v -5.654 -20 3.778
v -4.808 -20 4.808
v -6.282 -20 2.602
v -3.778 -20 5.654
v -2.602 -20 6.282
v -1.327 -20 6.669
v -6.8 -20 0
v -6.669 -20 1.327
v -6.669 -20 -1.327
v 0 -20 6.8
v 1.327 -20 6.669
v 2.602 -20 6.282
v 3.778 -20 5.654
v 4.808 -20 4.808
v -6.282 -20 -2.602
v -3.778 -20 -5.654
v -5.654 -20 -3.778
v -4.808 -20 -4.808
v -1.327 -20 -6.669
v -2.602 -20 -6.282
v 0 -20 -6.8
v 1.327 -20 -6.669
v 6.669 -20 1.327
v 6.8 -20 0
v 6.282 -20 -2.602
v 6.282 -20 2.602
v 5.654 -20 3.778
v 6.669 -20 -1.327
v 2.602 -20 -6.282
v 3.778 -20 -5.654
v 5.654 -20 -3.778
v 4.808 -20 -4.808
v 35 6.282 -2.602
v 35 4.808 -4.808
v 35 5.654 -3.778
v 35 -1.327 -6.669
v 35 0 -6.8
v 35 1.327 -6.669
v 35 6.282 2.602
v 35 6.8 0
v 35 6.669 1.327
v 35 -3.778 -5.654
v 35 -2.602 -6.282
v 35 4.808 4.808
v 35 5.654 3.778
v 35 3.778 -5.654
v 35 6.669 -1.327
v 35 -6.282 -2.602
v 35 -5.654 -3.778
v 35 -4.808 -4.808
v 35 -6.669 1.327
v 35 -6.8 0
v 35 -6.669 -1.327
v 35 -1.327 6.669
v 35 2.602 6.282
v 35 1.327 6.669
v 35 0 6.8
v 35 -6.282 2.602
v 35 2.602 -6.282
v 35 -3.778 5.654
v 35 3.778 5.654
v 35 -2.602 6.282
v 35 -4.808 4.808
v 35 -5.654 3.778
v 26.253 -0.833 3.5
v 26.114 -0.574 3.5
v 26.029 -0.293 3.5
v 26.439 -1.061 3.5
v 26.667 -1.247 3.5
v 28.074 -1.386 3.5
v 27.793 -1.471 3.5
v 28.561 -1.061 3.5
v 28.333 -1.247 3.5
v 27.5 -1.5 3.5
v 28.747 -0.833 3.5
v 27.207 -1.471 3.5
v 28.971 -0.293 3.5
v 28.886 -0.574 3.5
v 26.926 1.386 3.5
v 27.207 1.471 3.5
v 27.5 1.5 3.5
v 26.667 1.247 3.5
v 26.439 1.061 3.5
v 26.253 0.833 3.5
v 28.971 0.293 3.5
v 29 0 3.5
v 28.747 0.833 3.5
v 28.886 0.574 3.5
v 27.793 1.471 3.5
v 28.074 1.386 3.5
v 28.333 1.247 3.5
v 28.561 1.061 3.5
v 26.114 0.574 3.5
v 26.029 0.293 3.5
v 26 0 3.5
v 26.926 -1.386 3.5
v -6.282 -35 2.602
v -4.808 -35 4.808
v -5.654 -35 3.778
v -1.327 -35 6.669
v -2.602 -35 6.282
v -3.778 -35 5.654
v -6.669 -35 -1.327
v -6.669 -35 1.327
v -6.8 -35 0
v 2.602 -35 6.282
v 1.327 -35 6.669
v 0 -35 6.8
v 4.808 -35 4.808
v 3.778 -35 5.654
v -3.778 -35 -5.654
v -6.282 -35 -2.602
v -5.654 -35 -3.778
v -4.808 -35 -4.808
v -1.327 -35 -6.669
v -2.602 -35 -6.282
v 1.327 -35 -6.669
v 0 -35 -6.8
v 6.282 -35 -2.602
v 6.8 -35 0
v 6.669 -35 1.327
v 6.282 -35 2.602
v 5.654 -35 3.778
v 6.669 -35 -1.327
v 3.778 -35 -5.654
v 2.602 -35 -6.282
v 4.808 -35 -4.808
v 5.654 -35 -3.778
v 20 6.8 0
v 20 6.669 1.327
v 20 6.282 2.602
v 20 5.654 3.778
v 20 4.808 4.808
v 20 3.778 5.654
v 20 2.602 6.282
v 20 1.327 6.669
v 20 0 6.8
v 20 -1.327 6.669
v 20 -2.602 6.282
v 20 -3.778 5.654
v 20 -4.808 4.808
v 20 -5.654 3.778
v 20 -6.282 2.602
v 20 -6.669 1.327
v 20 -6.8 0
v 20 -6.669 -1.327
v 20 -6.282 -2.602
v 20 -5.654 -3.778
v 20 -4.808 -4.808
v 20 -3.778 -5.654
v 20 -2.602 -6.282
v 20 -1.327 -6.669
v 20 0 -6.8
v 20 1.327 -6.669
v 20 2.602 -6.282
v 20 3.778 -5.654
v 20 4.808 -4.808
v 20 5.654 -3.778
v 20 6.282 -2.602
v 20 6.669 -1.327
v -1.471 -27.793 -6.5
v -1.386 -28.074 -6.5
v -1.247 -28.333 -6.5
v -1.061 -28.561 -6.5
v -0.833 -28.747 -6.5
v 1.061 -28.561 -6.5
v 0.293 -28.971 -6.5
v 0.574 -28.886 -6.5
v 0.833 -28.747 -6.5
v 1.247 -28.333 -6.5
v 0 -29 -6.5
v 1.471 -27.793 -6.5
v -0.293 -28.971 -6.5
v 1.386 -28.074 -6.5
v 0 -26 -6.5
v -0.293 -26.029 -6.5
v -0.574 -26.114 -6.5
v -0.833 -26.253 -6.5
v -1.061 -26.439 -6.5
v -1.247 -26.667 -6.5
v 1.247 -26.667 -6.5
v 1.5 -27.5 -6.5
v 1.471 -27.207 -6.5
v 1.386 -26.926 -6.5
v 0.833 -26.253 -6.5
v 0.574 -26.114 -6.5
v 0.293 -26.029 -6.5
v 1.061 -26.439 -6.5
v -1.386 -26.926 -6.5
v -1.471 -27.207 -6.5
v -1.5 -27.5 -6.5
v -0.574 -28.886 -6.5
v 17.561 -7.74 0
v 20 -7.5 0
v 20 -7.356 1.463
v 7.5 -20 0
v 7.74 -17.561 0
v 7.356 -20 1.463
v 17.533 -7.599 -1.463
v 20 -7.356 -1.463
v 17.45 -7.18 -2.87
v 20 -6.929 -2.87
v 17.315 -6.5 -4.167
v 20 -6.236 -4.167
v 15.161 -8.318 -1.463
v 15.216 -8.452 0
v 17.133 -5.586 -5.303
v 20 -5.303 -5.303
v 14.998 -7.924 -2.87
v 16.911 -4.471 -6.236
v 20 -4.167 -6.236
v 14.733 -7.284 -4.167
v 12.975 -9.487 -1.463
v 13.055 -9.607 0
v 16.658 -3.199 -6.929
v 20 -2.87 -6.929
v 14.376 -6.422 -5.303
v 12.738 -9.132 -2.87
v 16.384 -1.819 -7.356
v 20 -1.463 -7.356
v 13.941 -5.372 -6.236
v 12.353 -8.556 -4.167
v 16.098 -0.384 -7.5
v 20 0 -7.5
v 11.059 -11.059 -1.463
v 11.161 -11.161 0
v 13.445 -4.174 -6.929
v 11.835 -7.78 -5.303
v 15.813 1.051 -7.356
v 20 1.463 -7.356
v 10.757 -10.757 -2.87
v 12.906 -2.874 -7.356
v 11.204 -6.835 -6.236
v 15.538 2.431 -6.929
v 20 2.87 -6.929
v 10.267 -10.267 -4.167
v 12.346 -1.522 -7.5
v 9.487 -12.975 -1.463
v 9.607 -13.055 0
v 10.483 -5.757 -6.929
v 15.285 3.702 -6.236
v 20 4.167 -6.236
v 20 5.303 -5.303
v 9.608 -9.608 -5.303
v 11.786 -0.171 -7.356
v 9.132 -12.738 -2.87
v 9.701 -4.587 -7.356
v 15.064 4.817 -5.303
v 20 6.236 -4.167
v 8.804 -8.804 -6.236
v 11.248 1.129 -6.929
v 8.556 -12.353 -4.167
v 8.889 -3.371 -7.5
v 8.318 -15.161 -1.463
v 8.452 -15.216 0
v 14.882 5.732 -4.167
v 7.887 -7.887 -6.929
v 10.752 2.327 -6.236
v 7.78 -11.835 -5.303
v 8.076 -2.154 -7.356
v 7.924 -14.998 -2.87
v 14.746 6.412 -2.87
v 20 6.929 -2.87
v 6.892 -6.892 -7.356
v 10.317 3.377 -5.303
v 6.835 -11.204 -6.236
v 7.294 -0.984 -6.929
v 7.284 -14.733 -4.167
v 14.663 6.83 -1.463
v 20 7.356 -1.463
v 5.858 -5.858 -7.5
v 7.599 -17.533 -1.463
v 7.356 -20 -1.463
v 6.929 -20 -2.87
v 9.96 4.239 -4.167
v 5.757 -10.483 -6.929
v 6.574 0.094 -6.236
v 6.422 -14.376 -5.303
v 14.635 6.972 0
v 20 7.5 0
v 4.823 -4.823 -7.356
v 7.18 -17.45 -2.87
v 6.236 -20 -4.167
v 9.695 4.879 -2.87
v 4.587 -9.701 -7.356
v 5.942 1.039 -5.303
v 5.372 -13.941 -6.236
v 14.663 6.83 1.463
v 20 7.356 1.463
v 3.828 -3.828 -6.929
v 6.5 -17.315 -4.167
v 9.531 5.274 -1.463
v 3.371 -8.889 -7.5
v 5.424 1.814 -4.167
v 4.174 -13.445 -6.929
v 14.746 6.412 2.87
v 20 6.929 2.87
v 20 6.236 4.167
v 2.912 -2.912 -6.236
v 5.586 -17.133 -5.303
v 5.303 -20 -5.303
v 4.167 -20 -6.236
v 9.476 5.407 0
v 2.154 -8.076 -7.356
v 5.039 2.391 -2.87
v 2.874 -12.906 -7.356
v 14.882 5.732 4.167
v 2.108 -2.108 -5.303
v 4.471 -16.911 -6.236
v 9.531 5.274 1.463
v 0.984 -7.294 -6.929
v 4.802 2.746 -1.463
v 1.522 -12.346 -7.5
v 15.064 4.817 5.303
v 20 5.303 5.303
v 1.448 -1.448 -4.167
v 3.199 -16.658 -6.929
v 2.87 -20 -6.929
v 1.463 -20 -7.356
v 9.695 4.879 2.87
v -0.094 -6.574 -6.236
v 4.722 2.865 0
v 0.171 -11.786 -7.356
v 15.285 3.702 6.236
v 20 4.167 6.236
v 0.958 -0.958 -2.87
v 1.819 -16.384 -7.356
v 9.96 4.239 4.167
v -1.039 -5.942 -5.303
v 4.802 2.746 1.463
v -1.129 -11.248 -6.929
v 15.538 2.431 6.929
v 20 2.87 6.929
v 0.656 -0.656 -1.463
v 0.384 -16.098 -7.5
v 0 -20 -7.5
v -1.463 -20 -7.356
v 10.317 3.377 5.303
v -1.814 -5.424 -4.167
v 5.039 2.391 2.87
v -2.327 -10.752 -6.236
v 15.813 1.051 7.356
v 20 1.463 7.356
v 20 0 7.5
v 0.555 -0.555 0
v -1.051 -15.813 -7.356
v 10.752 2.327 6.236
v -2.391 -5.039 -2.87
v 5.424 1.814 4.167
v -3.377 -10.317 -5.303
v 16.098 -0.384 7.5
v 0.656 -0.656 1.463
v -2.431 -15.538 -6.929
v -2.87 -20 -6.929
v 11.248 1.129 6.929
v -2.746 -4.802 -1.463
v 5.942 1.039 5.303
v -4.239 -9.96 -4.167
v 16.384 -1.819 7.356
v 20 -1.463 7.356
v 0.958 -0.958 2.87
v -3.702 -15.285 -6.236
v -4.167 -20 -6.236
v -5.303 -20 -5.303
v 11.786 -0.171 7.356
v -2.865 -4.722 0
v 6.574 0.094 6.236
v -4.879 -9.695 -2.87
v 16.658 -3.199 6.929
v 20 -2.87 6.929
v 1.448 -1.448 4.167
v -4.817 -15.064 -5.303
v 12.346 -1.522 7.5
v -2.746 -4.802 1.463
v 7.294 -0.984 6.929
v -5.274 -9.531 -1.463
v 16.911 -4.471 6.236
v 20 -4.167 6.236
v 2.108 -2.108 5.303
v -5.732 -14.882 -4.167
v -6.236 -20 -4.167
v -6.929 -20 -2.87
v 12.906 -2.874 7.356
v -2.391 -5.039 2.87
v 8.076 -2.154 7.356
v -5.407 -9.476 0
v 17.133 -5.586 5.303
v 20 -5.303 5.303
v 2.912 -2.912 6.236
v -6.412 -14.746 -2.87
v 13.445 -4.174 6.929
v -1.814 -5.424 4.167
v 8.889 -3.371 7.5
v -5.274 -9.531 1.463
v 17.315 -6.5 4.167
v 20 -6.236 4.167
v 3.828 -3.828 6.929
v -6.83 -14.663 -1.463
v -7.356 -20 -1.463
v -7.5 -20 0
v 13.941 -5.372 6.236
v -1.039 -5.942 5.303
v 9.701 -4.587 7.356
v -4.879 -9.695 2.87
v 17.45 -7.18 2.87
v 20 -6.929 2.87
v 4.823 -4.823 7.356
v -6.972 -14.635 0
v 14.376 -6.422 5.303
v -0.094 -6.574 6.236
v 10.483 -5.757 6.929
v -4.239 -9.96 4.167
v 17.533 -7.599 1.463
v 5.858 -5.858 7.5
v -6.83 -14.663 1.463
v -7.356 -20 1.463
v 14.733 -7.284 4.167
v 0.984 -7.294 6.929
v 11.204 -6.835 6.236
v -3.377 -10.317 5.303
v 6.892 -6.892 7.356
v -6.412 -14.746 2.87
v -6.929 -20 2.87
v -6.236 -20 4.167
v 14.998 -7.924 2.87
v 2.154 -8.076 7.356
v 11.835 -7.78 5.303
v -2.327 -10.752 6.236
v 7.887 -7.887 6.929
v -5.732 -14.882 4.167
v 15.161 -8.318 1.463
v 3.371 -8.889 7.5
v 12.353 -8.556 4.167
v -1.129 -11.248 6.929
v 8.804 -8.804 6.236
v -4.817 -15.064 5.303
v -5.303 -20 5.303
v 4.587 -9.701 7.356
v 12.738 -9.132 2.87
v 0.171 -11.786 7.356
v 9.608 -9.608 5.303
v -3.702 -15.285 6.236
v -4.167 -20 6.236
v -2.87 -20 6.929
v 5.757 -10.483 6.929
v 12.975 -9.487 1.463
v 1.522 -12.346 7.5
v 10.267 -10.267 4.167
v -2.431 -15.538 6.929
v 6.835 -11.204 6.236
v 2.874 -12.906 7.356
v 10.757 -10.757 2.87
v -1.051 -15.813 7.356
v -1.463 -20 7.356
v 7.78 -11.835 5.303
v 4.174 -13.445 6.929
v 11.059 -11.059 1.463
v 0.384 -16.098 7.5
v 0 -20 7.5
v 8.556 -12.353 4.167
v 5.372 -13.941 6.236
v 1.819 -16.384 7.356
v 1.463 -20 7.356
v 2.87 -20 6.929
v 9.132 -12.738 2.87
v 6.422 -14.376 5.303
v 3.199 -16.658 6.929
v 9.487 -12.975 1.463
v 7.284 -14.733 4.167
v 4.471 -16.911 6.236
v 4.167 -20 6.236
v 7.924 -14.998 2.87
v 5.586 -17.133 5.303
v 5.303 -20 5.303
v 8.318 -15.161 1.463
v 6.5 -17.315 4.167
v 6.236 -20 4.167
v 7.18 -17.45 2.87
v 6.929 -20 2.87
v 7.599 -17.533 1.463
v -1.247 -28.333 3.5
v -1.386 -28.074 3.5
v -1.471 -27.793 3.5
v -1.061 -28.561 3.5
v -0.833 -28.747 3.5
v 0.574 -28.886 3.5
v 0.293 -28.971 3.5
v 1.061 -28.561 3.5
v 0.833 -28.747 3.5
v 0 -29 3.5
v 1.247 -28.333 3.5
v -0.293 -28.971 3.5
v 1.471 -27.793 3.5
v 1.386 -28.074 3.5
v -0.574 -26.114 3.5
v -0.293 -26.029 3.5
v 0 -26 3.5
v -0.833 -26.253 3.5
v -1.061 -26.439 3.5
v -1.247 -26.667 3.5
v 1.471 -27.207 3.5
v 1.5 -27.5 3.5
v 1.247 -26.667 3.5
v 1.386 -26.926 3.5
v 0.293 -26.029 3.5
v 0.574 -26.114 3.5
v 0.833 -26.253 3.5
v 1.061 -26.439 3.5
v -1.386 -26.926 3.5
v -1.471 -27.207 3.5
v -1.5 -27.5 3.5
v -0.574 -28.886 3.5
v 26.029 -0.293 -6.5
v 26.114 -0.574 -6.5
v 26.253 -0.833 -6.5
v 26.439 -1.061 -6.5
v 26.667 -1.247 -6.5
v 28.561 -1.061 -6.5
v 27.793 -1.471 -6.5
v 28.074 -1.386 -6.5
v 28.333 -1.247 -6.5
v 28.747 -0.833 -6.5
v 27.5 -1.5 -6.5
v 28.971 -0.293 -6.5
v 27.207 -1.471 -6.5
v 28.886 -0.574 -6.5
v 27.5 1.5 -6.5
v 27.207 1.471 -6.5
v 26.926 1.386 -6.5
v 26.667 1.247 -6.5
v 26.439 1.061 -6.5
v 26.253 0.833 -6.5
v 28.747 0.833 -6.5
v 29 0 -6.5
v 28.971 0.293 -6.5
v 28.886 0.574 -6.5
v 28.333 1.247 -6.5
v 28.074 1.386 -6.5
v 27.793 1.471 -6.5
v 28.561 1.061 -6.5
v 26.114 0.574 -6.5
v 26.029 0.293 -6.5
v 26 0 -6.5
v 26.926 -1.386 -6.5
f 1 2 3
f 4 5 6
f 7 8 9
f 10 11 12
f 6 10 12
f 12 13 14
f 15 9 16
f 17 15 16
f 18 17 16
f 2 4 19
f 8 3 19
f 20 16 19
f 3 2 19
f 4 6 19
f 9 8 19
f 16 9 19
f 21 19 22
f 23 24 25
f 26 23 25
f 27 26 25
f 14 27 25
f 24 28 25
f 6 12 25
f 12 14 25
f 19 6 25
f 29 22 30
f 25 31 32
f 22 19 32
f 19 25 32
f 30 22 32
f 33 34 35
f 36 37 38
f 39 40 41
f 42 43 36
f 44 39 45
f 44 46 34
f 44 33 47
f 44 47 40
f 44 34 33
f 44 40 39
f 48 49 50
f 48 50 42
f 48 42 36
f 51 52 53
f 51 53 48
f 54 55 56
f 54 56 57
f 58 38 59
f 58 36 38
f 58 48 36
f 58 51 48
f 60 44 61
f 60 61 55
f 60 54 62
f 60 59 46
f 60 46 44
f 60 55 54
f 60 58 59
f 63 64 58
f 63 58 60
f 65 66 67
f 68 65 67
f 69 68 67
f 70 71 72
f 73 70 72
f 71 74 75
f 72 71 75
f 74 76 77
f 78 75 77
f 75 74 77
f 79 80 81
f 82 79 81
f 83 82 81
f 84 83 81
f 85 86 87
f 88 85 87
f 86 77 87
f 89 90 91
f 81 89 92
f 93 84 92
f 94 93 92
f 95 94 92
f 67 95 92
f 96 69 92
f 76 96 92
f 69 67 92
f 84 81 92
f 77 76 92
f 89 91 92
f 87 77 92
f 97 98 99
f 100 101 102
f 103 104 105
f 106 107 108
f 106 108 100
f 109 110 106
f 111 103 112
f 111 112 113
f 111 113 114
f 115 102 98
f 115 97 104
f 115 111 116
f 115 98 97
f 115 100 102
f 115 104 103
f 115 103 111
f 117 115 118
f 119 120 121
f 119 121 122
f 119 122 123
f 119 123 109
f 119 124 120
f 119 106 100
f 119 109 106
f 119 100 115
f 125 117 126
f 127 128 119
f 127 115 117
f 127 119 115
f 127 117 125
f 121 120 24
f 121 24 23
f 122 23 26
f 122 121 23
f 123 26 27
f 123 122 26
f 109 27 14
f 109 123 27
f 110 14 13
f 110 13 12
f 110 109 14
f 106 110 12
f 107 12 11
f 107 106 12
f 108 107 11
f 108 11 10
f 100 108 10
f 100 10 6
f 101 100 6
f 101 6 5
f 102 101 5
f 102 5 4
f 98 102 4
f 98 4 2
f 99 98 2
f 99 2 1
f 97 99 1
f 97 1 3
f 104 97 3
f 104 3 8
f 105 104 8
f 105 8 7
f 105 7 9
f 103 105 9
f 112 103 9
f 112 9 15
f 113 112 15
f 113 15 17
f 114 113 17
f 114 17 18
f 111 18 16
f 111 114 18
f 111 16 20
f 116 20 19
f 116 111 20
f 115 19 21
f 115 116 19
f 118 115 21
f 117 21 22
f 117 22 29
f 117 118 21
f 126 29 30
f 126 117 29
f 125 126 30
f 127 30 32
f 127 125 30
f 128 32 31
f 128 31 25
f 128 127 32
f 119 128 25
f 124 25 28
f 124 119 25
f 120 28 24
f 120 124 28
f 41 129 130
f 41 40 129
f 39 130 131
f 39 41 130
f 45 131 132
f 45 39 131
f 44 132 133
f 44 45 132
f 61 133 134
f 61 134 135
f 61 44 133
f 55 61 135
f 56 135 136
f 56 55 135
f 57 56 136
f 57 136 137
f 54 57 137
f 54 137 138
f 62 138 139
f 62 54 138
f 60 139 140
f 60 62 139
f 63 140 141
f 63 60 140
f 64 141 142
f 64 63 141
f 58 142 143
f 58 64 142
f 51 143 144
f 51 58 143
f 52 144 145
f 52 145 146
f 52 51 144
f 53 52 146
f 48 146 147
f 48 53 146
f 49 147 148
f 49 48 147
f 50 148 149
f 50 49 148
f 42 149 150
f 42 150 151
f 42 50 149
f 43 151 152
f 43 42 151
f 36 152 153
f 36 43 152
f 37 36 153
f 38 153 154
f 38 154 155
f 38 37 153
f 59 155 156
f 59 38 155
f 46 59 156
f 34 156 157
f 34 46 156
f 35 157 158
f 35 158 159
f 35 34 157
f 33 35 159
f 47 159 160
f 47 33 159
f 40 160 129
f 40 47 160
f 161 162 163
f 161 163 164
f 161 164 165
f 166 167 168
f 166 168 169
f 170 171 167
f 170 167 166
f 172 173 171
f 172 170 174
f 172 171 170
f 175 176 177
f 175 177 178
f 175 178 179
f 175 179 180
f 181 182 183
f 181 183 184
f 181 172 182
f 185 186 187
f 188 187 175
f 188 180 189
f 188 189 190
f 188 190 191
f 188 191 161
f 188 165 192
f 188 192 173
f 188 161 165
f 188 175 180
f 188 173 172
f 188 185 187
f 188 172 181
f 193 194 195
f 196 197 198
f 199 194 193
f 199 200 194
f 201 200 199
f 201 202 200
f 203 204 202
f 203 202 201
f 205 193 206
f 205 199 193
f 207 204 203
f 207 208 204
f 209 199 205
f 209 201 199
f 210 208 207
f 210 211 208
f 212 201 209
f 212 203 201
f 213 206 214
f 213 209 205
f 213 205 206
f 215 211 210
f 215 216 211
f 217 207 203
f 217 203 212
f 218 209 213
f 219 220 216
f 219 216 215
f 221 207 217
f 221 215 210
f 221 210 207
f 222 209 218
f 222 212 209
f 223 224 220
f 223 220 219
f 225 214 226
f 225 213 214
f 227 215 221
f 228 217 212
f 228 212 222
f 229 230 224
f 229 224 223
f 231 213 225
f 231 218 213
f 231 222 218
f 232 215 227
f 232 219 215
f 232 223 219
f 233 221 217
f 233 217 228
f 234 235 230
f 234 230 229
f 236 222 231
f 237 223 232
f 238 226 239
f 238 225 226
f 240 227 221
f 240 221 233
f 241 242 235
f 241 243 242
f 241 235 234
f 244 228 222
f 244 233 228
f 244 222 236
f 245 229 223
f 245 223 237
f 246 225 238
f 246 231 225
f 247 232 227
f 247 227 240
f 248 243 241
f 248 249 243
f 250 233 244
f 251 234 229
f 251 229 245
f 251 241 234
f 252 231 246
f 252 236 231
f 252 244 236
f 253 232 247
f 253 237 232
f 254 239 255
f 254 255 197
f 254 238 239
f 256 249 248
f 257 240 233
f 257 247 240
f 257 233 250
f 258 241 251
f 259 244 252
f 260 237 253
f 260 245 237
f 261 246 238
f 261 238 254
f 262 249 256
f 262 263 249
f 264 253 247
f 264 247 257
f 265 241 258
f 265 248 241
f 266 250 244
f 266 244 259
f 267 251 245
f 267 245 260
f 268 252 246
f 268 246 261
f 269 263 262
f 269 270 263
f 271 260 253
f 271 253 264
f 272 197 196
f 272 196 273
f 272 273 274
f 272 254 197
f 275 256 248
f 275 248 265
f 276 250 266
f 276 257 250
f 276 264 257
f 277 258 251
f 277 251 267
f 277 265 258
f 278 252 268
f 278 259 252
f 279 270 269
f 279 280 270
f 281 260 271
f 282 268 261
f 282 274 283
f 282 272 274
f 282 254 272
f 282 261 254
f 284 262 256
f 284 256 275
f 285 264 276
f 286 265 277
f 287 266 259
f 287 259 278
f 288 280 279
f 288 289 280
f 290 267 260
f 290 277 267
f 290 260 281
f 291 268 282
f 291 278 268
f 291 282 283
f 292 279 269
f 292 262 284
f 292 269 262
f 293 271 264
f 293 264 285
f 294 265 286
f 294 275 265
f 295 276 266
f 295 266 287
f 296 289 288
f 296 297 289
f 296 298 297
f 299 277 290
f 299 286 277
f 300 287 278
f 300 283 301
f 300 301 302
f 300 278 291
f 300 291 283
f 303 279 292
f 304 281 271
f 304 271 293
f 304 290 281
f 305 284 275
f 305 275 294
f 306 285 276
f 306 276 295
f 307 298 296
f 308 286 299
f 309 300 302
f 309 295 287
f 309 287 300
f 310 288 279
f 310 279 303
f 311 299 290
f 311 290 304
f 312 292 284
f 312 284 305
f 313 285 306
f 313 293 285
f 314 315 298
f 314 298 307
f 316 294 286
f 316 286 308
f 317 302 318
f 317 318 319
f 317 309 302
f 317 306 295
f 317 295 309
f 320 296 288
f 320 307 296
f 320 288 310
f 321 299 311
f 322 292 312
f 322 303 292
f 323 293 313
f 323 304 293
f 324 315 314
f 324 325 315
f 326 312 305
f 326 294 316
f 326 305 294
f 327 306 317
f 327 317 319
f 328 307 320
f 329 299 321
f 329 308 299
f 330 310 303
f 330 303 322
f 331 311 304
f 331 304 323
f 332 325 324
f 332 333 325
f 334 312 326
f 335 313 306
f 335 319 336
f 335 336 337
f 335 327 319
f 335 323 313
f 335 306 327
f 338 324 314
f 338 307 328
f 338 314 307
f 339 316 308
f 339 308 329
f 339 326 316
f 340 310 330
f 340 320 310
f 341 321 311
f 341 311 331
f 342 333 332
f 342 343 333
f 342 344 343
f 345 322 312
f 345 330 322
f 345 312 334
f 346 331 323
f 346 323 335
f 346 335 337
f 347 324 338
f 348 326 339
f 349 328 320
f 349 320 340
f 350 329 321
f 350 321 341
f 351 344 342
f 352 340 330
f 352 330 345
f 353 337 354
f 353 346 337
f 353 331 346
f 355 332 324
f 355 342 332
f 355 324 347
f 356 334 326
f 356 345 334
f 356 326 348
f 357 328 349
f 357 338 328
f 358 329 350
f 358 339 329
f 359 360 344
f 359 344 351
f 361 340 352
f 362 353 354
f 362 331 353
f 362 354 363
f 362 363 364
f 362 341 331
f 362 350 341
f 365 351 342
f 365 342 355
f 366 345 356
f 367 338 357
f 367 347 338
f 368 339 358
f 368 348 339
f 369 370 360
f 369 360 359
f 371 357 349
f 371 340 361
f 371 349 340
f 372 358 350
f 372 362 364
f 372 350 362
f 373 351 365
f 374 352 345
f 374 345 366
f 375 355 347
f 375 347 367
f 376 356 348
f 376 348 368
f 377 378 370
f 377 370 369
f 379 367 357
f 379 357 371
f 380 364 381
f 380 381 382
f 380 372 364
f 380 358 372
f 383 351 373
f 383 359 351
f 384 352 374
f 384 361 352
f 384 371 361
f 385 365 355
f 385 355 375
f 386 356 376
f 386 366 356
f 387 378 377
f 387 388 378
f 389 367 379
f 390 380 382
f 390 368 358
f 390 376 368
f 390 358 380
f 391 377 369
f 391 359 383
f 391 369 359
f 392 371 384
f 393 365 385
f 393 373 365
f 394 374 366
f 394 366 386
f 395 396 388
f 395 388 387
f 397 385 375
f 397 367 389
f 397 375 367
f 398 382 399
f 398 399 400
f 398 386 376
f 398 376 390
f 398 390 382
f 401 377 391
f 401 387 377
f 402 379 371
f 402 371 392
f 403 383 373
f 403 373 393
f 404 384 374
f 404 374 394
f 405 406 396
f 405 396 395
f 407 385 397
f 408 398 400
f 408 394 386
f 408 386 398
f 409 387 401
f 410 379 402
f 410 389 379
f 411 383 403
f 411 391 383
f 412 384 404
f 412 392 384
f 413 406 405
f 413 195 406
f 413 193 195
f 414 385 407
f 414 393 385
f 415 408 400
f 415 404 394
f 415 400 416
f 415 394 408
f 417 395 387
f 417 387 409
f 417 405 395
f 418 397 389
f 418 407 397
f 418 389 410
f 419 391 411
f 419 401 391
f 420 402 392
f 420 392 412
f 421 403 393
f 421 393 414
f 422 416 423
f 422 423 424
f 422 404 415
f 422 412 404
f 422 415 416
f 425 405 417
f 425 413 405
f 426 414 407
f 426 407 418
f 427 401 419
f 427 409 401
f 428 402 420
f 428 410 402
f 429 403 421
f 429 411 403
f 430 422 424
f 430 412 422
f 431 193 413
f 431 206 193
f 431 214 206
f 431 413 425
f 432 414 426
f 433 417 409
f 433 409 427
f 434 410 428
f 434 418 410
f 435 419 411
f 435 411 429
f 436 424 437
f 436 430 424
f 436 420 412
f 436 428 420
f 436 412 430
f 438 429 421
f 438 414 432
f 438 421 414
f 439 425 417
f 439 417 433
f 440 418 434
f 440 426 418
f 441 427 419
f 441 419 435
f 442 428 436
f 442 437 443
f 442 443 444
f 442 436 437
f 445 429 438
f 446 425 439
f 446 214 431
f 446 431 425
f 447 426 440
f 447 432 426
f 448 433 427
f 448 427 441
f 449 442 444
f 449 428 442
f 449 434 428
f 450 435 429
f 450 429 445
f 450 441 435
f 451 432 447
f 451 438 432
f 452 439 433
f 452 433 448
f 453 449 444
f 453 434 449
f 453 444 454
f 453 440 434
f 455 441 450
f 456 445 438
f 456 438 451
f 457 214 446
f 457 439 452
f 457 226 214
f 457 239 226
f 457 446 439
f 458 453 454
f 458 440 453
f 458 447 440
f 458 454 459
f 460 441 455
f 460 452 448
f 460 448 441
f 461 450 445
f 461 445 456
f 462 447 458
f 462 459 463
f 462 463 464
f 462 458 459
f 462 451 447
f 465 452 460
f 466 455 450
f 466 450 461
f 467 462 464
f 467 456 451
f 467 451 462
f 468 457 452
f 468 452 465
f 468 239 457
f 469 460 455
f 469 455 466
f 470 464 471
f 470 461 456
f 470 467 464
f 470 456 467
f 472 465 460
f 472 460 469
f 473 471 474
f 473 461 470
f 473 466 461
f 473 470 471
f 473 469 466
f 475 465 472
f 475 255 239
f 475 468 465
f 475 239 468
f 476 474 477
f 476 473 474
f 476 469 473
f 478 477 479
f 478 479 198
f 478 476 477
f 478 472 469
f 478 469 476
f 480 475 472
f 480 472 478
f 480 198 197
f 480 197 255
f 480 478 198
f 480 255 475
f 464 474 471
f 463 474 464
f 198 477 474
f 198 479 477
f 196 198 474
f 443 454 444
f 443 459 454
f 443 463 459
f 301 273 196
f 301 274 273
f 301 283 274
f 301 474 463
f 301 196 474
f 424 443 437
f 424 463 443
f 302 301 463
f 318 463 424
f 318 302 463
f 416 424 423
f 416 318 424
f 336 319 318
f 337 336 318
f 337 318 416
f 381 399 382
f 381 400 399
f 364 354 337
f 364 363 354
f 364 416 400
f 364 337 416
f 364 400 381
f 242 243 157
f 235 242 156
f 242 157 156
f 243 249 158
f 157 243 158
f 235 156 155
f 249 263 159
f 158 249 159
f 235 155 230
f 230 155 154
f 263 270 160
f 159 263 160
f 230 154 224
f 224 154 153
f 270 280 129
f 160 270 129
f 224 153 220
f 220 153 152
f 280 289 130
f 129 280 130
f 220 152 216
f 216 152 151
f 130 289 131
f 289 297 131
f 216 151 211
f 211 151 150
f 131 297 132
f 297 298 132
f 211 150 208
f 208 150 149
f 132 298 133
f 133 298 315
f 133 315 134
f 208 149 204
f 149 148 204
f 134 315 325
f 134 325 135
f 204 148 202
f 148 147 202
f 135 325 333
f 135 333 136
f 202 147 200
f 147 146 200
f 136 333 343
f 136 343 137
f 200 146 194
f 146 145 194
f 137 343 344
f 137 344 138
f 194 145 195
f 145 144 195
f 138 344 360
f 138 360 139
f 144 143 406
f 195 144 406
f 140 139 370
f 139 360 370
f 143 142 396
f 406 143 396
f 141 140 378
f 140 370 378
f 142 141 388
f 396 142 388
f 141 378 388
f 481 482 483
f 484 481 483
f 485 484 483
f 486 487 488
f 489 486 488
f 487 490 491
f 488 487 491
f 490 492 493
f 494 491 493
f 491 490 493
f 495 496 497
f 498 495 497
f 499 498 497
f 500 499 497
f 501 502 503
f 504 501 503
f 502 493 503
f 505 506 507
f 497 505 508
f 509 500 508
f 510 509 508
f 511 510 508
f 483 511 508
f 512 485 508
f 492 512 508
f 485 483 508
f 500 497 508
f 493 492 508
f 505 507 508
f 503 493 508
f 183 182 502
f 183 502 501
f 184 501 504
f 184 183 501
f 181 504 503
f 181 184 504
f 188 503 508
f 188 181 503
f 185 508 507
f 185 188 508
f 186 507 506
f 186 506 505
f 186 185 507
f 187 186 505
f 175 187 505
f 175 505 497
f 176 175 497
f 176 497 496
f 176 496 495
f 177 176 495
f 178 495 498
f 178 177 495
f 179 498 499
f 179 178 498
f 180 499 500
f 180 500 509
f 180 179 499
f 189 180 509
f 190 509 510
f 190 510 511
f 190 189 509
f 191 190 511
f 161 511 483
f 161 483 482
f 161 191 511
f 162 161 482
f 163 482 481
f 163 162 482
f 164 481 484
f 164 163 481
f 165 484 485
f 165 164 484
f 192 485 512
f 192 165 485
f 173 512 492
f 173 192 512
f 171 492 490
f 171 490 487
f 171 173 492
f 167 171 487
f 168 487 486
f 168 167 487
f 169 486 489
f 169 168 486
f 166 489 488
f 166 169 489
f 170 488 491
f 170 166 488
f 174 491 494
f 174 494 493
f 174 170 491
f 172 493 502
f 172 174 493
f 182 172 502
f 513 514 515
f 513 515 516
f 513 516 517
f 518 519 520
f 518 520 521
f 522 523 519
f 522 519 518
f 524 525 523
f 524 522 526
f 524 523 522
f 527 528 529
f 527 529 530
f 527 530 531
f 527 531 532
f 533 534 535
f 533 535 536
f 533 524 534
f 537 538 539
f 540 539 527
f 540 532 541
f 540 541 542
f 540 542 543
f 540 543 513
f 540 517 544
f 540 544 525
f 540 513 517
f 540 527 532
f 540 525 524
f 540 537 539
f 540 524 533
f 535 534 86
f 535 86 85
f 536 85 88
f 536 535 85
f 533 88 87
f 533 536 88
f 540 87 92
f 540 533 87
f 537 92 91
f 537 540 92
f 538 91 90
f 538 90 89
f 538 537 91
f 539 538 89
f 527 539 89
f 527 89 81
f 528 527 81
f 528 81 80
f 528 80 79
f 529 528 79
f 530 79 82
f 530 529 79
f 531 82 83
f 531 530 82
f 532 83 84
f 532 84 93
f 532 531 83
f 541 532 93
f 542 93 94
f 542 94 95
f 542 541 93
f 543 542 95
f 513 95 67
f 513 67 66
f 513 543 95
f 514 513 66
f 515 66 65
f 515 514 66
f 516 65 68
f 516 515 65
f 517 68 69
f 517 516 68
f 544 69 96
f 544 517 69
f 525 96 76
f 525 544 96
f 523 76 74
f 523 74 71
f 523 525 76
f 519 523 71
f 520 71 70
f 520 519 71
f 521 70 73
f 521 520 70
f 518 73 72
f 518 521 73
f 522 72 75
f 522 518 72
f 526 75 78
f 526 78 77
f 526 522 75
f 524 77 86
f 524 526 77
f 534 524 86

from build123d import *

# Parameters (mm, degrees)
F3_R      = 7.5
F4_R      = 6.8
F7_R      = 6.8
F12_R     = 1.5
F13_DEPTH = 10


with BuildPart() as f8:
    # F8: sweep along a path in F0
    with BuildLine(Plane.XY) as f8_path:
        ThreePointArc((20, 0), (5.857864, -5.857864), (0, -20))
    # F3 (on offset) → F8 (sweep)
    with BuildSketch(Plane.XZ.offset(20)):
        Circle(F3_R)
    sweep(path=f8_path.line)

    # F10: sweep along a path in F0
    with BuildLine(Plane.XY) as f10_path:
        Line((20, 0), (35, 0))
    # F7 (on offset) → F10 (sweep)
    with BuildSketch(Plane.YZ.offset(35)):
        Circle(F7_R)
    sweep(path=f10_path.line)


with BuildPart() as f9:
    # F9: sweep along a path in F0
    with BuildLine(Plane.XY) as f9_path:
        Line((0, -20), (0, -35))
    # F4 (on offset) → F9 (sweep)
    with BuildSketch(Plane.XZ.offset(35)):
        Circle(F4_R)
    sweep(path=f9_path.line)


with BuildPart() as f13_tool:
    # F12 (on offset) → F13 (new body)
    with BuildSketch(Plane.XY.offset(-6.5)):
        with Locations((0, -27.5)):
            Circle(F12_R)
        with Locations((27.5, 0)):
            Circle(F12_R)
    extrude(amount=F13_DEPTH)


with BuildPart() as f8_1:
    add(f8.part)

    # F13: cut by f13_tool
    add(f13_tool.part, mode=Mode.SUBTRACT)


with BuildPart() as f9_1:
    add(f9.part)

    # F13: cut by f13_tool
    add(f13_tool.part, mode=Mode.SUBTRACT)


solid = Compound([f8_1.part, f9_1.part])
